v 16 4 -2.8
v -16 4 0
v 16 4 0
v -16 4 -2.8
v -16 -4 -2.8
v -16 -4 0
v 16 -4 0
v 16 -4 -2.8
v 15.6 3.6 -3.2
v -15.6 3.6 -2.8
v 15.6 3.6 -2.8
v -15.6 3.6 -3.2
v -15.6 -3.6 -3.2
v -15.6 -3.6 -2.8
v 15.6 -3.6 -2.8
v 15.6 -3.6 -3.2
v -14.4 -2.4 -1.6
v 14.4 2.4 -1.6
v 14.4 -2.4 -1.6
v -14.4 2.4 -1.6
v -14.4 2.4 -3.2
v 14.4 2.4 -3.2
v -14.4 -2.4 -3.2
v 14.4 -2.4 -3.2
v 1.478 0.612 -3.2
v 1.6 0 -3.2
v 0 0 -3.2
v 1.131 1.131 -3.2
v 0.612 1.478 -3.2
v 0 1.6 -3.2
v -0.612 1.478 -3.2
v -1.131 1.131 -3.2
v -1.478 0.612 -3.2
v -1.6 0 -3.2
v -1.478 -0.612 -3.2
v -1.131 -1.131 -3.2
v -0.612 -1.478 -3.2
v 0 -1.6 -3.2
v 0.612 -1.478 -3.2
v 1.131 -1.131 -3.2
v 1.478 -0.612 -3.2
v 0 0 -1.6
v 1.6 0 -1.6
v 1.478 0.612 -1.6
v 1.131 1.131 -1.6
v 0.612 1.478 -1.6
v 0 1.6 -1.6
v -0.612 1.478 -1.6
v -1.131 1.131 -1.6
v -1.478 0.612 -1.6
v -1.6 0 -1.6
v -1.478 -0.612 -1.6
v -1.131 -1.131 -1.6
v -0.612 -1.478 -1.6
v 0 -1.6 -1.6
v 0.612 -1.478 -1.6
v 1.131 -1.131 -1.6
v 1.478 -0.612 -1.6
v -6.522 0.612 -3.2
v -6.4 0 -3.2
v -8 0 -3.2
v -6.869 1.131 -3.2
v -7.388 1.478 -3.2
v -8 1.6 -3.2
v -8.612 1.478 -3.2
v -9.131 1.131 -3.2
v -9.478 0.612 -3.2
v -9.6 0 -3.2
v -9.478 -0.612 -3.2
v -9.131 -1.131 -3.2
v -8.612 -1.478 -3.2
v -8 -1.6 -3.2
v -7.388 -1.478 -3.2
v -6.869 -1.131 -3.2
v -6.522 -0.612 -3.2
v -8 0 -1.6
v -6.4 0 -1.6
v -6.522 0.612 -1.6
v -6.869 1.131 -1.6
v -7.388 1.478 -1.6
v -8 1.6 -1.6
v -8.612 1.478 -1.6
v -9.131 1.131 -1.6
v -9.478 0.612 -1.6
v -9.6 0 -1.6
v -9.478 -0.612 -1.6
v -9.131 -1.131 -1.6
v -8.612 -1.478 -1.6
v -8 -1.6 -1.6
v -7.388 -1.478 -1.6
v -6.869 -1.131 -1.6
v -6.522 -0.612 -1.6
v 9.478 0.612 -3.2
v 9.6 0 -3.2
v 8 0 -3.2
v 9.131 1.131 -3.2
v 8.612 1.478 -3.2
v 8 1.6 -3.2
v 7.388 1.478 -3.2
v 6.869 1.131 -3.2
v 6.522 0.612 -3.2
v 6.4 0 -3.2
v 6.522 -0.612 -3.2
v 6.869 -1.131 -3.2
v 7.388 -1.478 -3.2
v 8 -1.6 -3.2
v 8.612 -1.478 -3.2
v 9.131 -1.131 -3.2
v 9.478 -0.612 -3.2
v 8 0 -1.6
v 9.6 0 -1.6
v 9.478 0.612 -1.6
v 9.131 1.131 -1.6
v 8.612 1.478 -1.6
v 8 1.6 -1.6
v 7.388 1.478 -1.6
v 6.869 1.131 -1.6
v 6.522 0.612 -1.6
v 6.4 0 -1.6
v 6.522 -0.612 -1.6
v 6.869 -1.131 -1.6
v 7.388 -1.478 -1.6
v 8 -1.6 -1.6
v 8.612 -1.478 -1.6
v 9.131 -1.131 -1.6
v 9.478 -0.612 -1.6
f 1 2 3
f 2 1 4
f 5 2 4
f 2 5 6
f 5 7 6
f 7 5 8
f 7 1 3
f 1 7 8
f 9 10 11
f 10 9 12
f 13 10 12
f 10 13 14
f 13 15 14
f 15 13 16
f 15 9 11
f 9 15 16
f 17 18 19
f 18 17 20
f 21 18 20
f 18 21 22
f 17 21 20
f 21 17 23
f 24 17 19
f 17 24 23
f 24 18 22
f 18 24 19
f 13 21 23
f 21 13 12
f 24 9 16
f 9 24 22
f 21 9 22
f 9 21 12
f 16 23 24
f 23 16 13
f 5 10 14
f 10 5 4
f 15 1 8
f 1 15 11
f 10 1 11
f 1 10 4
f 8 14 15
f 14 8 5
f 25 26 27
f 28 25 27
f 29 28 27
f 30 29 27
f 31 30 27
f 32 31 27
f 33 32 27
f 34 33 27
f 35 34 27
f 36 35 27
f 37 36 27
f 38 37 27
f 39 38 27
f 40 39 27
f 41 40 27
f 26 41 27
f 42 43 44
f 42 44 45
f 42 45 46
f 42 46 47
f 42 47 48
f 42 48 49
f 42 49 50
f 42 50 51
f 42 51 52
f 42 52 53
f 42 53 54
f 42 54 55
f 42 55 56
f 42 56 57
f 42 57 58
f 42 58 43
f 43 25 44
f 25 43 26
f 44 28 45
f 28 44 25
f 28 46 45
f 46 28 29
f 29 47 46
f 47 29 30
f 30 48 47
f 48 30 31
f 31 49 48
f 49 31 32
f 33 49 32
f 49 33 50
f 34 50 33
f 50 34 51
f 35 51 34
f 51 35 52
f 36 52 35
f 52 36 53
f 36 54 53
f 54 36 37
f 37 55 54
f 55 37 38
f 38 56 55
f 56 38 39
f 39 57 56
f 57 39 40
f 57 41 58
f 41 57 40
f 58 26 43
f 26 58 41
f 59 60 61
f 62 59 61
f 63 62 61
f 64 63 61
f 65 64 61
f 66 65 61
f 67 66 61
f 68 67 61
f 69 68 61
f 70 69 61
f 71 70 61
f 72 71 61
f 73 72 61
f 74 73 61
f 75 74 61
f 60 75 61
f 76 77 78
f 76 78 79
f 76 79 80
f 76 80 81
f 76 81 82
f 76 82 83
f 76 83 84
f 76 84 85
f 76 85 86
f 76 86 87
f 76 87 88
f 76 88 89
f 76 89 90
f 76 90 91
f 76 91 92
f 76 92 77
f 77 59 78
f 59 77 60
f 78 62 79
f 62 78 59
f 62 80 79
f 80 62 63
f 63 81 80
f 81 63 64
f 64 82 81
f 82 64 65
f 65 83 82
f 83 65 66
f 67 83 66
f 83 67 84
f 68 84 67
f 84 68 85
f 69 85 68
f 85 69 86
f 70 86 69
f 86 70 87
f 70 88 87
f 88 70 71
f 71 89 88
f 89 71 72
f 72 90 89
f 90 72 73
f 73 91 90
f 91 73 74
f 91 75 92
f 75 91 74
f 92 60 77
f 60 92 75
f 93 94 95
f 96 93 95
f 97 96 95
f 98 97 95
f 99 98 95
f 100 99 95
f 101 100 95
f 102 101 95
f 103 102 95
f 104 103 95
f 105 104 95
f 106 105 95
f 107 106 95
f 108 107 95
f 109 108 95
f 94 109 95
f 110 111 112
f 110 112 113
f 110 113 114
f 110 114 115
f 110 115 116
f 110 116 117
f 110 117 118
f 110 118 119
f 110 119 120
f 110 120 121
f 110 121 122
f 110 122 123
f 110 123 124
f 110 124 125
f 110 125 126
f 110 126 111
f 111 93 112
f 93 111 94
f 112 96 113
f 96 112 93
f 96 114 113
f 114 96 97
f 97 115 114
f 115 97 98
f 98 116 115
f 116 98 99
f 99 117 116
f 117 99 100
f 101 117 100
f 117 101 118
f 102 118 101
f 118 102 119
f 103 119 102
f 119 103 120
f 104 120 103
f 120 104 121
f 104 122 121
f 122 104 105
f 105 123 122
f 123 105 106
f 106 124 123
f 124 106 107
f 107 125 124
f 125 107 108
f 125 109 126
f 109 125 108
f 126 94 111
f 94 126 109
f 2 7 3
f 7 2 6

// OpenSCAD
// file: ../p/4-4edge.scad
use <../lib.scad>
function ldraw_lib__4_4edge() = [
// 0 Circle 1.0
// 0 Name: 4-4edge.dat
// 0 Author: James Jessiman
// 0 !LDRAW_ORG Primitive UPDATE 2017-01
// 0 !LICENSE Licensed under CC BY 2.0 and CC BY 4.0 : see CAreadme.txt
// 
// 0 BFC CERTIFY CCW
  [0,"BFC","CERTIFY"],
  [0,"BFC","CCW"],
// 
// 0 !HISTORY 1998-12-15 [PTadmin] Official Update 1998-10
// 0 !HISTORY 2005-12-28 [PTadmin] Official Update 2005-01
// 0 !HISTORY 2007-06-24 [PTadmin] Header formatted for Contributor Agreement
// 0 !HISTORY 2008-07-01 [PTadmin] Official Update 2008-01
// 0 !HISTORY 2017-01-15 [Steffen] BFCed
// 0 !HISTORY 2017-12-30 [PTadmin] Official Update 2017-01
// 
// 
// 2 24 1 0 0 0.9239 0 0.3827
  [2,24,1,0,0,0.9239,0,0.3827],
// 2 24 0.9239 0 0.3827 0.7071 0 0.7071
  [2,24,0.9239,0,0.3827,0.7071,0,0.7071],
// 2 24 0.7071 0 0.7071 0.3827 0 0.9239
  [2,24,0.7071,0,0.7071,0.3827,0,0.9239],
// 2 24 0.3827 0 0.9239 0 0 1
  [2,24,0.3827,0,0.9239,0,0,1],
// 2 24 0 0 1 -0.3827 0 0.9239
  [2,24,0,0,1,-0.3827,0,0.9239],
// 2 24 -0.3827 0 0.9239 -0.7071 0 0.7071
  [2,24,-0.3827,0,0.9239,-0.7071,0,0.7071],
// 2 24 -0.7071 0 0.7071 -0.9239 0 0.3827
  [2,24,-0.7071,0,0.7071,-0.9239,0,0.3827],
// 2 24 -0.9239 0 0.3827 -1 0 -0
  [2,24,-0.9239,0,0.3827,-1,0,-0],
// 2 24 -1 0 -0 -0.9239 0 -0.3827
  [2,24,-1,0,-0,-0.9239,0,-0.3827],
// 2 24 -0.9239 0 -0.3827 -0.7071 0 -0.7071
  [2,24,-0.9239,0,-0.3827,-0.7071,0,-0.7071],
// 2 24 -0.7071 0 -0.7071 -0.3827 0 -0.9239
  [2,24,-0.7071,0,-0.7071,-0.3827,0,-0.9239],
// 2 24 -0.3827 0 -0.9239 0 0 -1
  [2,24,-0.3827,0,-0.9239,0,0,-1],
// 2 24 0 0 -1 0.3827 0 -0.9239
  [2,24,0,0,-1,0.3827,0,-0.9239],
// 2 24 0.3827 0 -0.9239 0.7071 0 -0.7071
  [2,24,0.3827,0,-0.9239,0.7071,0,-0.7071],
// 2 24 0.7071 0 -0.7071 0.9239 0 -0.3827
  [2,24,0.7071,0,-0.7071,0.9239,0,-0.3827],
// 2 24 0.9239 0 -0.3827 1 0 0
  [2,24,0.9239,0,-0.3827,1,0,0],
];
module ldraw_lib__4_4edge(step=0, col=false, unit=2/5, alt=false, line=0.2, solid=!$preview)
    makepoly(ldraw_lib__4_4edge(), step=step, col=col, unit=unit, alt=alt, line=line, solid=solid);
ldraw_lib__4_4edge(line=0.2);
// file: ../p/4-4disc.scad
use <../lib.scad>
function ldraw_lib__4_4disc() = [
// 0 Disc 1.0
// 0 Name: 4-4disc.dat
// 0 Author: James Jessiman
// 0 !LDRAW_ORG Primitive UPDATE 2002-02
// 0 !LICENSE Licensed under CC BY 2.0 and CC BY 4.0 : see CAreadme.txt
// 
// 0 BFC CERTIFY CCW
  [0,"BFC","CERTIFY"],
  [0,"BFC","CCW"],
// 
// 0 !HISTORY 1998-12-15 [PTadmin] Official Update 1998-10
// 0 !HISTORY 2002-03-23 [sbliss] Added BFC statement
// 0 !HISTORY 2002-04-25 [PTadmin] Official Update 2002-02
// 0 !HISTORY 2007-06-24 [PTadmin] Header formatted for Contributor Agreement
// 0 !HISTORY 2008-07-01 [PTadmin] Official Update 2008-01
// 
// 
// 3 16 0 0 0 1 0 0 0.9239 0 0.3827
  [3,16,0,0,0,1,0,0,0.9239,0,0.3827],
// 3 16 0 0 0 0.9239 0 0.3827 0.7071 0 0.7071
  [3,16,0,0,0,0.9239,0,0.3827,0.7071,0,0.7071],
// 3 16 0 0 0 0.7071 0 0.7071 0.3827 0 0.9239
  [3,16,0,0,0,0.7071,0,0.7071,0.3827,0,0.9239],
// 3 16 0 0 0 0.3827 0 0.9239 0 0 1
  [3,16,0,0,0,0.3827,0,0.9239,0,0,1],
// 3 16 0 0 0 0 0 1 -0.3827 0 0.9239
  [3,16,0,0,0,0,0,1,-0.3827,0,0.9239],
// 3 16 0 0 0 -0.3827 0 0.9239 -0.7071 0 0.7071
  [3,16,0,0,0,-0.3827,0,0.9239,-0.7071,0,0.7071],
// 3 16 0 0 0 -0.7071 0 0.7071 -0.9239 0 0.3827
  [3,16,0,0,0,-0.7071,0,0.7071,-0.9239,0,0.3827],
// 3 16 0 0 0 -0.9239 0 0.3827 -1 0 -0
  [3,16,0,0,0,-0.9239,0,0.3827,-1,0,-0],
// 3 16 0 0 0 -1 0 -0 -0.9239 0 -0.3827
  [3,16,0,0,0,-1,0,-0,-0.9239,0,-0.3827],
// 3 16 0 0 0 -0.9239 0 -0.3827 -0.7071 0 -0.7071
  [3,16,0,0,0,-0.9239,0,-0.3827,-0.7071,0,-0.7071],
// 3 16 0 0 0 -0.7071 0 -0.7071 -0.3827 0 -0.9239
  [3,16,0,0,0,-0.7071,0,-0.7071,-0.3827,0,-0.9239],
// 3 16 0 0 0 -0.3827 0 -0.9239 0 0 -1
  [3,16,0,0,0,-0.3827,0,-0.9239,0,0,-1],
// 3 16 0 0 0 0 0 -1 0.3827 0 -0.9239
  [3,16,0,0,0,0,0,-1,0.3827,0,-0.9239],
// 3 16 0 0 0 0.3827 0 -0.9239 0.7071 0 -0.7071
  [3,16,0,0,0,0.3827,0,-0.9239,0.7071,0,-0.7071],
// 3 16 0 0 0 0.7071 0 -0.7071 0.9239 0 -0.3827
  [3,16,0,0,0,0.7071,0,-0.7071,0.9239,0,-0.3827],
// 3 16 0 0 0 0.9239 0 -0.3827 1 0 0
  [3,16,0,0,0,0.9239,0,-0.3827,1,0,0],
// 0
];
module ldraw_lib__4_4disc(step=0, col=false, unit=2/5, alt=false, line=0.2, solid=!$preview)
    makepoly(ldraw_lib__4_4disc(), step=step, col=col, unit=unit, alt=alt, line=line, solid=solid);
ldraw_lib__4_4disc(line=0.2);
// file: ../p/4-4cyli.scad
use <../lib.scad>
$fa=1; $fs=0.2;
function ldraw_lib__4_4cyli(realsolid=false) = [
// 0 Cylinder 1.0
// 0 Name: 4-4cyli.dat
// 0 Author: James Jessiman
// 0 !LDRAW_ORG Primitive UPDATE 2005-01
// 0 !LICENSE Licensed under CC BY 2.0 and CC BY 4.0 : see CAreadme.txt
// 
// 0 BFC CERTIFY CCW
  [0,"BFC","CERTIFY"],
  [0,"BFC","CCW"],
// 
// 0 !HISTORY 1998-12-15 [PTadmin] Official Update 1998-10
// 0 !HISTORY 2002-03-23 [sbliss] Added BFC statement; merged headers from files in distributions LDraw 0.27 and Complete.
// 0 !HISTORY 2002-04-25 [PTadmin] Official Update 2002-02
// 0 !HISTORY 2004-12-14 [guyvivan] BFC CCW
// 0 !HISTORY 2005-12-28 [PTadmin] Official Update 2005-01
// 0 !HISTORY 2007-06-24 [PTadmin] Header formatted for Contributor Agreement
// 0 !HISTORY 2008-07-01 [PTadmin] Official Update 2008-01
// 
// 
// 4 16 1 1 0 0.9239 1 0.3827 0.9239 0 0.3827 1 0 0
  [4,16,1,1,0,0.9239,1,0.3827,0.9239,0,0.3827,1,0,0],
// 5 24 1 0 0 1 1 0 0.9239 0 0.3827 0.9239 0 -0.3827
  [5,24,1,0,0,1,1,0,0.9239,0,0.3827,0.9239,0,-0.3827],
// 4 16 0.9239 1 0.3827 0.7071 1 0.7071 0.7071 0 0.7071 0.9239 0 0.3827
  [4,16,0.9239,1,0.3827,0.7071,1,0.7071,0.7071,0,0.7071,0.9239,0,0.3827],
// 5 24 0.9239 0 0.3827 0.9239 1 0.3827 0.7071 0 0.7071 1 0 0
  [5,24,0.9239,0,0.3827,0.9239,1,0.3827,0.7071,0,0.7071,1,0,0],
// 4 16 0.7071 1 0.7071 0.3827 1 0.9239 0.3827 0 0.9239 0.7071 0 0.7071
  [4,16,0.7071,1,0.7071,0.3827,1,0.9239,0.3827,0,0.9239,0.7071,0,0.7071],
// 5 24 0.7071 0 0.7071 0.7071 1 0.7071 0.3827 0 0.9239 0.9239 0 0.3827
  [5,24,0.7071,0,0.7071,0.7071,1,0.7071,0.3827,0,0.9239,0.9239,0,0.3827],
// 4 16 0.3827 1 0.9239 0 1 1 0 0 1 0.3827 0 0.9239
  [4,16,0.3827,1,0.9239,0,1,1,0,0,1,0.3827,0,0.9239],
// 5 24 0.3827 0 0.9239 0.3827 1 0.9239 0 0 1 0.7071 0 0.7071
  [5,24,0.3827,0,0.9239,0.3827,1,0.9239,0,0,1,0.7071,0,0.7071],
// 4 16 0 1 1 -0.3827 1 0.9239 -0.3827 0 0.9239 0 0 1
  [4,16,0,1,1,-0.3827,1,0.9239,-0.3827,0,0.9239,0,0,1],
// 5 24 0 0 1 0 1 1 -0.3827 0 0.9239 0.3827 0 0.9239
  [5,24,0,0,1,0,1,1,-0.3827,0,0.9239,0.3827,0,0.9239],
// 4 16 -0.3827 1 0.9239 -0.7071 1 0.7071 -0.7071 0 0.7071 -0.3827 0 0.9239
  [4,16,-0.3827,1,0.9239,-0.7071,1,0.7071,-0.7071,0,0.7071,-0.3827,0,0.9239],
// 5 24 -0.3827 0 0.9239 -0.3827 1 0.9239 -0.7071 0 0.7071 0 0 1
  [5,24,-0.3827,0,0.9239,-0.3827,1,0.9239,-0.7071,0,0.7071,0,0,1],
// 4 16 -0.7071 1 0.7071 -0.9239 1 0.3827 -0.9239 0 0.3827 -0.7071 0 0.7071
  [4,16,-0.7071,1,0.7071,-0.9239,1,0.3827,-0.9239,0,0.3827,-0.7071,0,0.7071],
// 5 24 -0.7071 0 0.7071 -0.7071 1 0.7071 -0.9239 0 0.3827 -0.3827 0 0.9239
  [5,24,-0.7071,0,0.7071,-0.7071,1,0.7071,-0.9239,0,0.3827,-0.3827,0,0.9239],
// 4 16 -0.9239 1 0.3827 -1 1 0 -1 0 0 -0.9239 0 0.3827
  [4,16,-0.9239,1,0.3827,-1,1,0,-1,0,0,-0.9239,0,0.3827],
// 5 24 -0.9239 0 0.3827 -0.9239 1 0.3827 -1 0 0 -0.7071 0 0.7071
  [5,24,-0.9239,0,0.3827,-0.9239,1,0.3827,-1,0,0,-0.7071,0,0.7071],
// 4 16 -1 1 0 -0.9239 1 -0.3827 -0.9239 0 -0.3827 -1 0 0
  [4,16,-1,1,0,-0.9239,1,-0.3827,-0.9239,0,-0.3827,-1,0,0],
// 5 24 -1 0 0 -1 1 0 -0.9239 0 -0.3827 -0.9239 0 0.3827
  [5,24,-1,0,0,-1,1,0,-0.9239,0,-0.3827,-0.9239,0,0.3827],
// 4 16 -0.9239 1 -0.3827 -0.7071 1 -0.7071 -0.7071 0 -0.7071 -0.9239 0 -0.3827
  [4,16,-0.9239,1,-0.3827,-0.7071,1,-0.7071,-0.7071,0,-0.7071,-0.9239,0,-0.3827],
// 5 24 -0.9239 0 -0.3827 -0.9239 1 -0.3827 -0.7071 0 -0.7071 -1 0 0
  [5,24,-0.9239,0,-0.3827,-0.9239,1,-0.3827,-0.7071,0,-0.7071,-1,0,0],
// 4 16 -0.7071 1 -0.7071 -0.3827 1 -0.9239 -0.3827 0 -0.9239 -0.7071 0 -0.7071
  [4,16,-0.7071,1,-0.7071,-0.3827,1,-0.9239,-0.3827,0,-0.9239,-0.7071,0,-0.7071],
// 5 24 -0.7071 0 -0.7071 -0.7071 1 -0.7071 -0.3827 0 -0.9239 -0.9239 0 -0.3827
  [5,24,-0.7071,0,-0.7071,-0.7071,1,-0.7071,-0.3827,0,-0.9239,-0.9239,0,-0.3827],
// 4 16 -0.3827 1 -0.9239 0 1 -1 0 0 -1 -0.3827 0 -0.9239
  [4,16,-0.3827,1,-0.9239,0,1,-1,0,0,-1,-0.3827,0,-0.9239],
// 5 24 -0.3827 0 -0.9239 -0.3827 1 -0.9239 0 0 -1 -0.7071 0 -0.7071
  [5,24,-0.3827,0,-0.9239,-0.3827,1,-0.9239,0,0,-1,-0.7071,0,-0.7071],
// 4 16 0 1 -1 0.3827 1 -0.9239 0.3827 0 -0.9239 0 0 -1
  [4,16,0,1,-1,0.3827,1,-0.9239,0.3827,0,-0.9239,0,0,-1],
// 5 24 0 0 -1 0 1 -1 0.3827 0 -0.9239 -0.3827 0 -0.9239
  [5,24,0,0,-1,0,1,-1,0.3827,0,-0.9239,-0.3827,0,-0.9239],
// 4 16 0.3827 1 -0.9239 0.7071 1 -0.7071 0.7071 0 -0.7071 0.3827 0 -0.9239
  [4,16,0.3827,1,-0.9239,0.7071,1,-0.7071,0.7071,0,-0.7071,0.3827,0,-0.9239],
// 5 24 0.3827 0 -0.9239 0.3827 1 -0.9239 0.7071 0 -0.7071 0 0 -1
  [5,24,0.3827,0,-0.9239,0.3827,1,-0.9239,0.7071,0,-0.7071,0,0,-1],
// 4 16 0.7071 1 -0.7071 0.9239 1 -0.3827 0.9239 0 -0.3827 0.7071 0 -0.7071
  [4,16,0.7071,1,-0.7071,0.9239,1,-0.3827,0.9239,0,-0.3827,0.7071,0,-0.7071],
// 5 24 0.7071 0 -0.7071 0.7071 1 -0.7071 0.9239 0 -0.3827 0.3827 0 -0.9239
  [5,24,0.7071,0,-0.7071,0.7071,1,-0.7071,0.9239,0,-0.3827,0.3827,0,-0.9239],
// 4 16 0.9239 1 -0.3827 1 1 0 1 0 0 0.9239 0 -0.3827
  [4,16,0.9239,1,-0.3827,1,1,0,1,0,0,0.9239,0,-0.3827],
// 5 24 0.9239 0 -0.3827 0.9239 1 -0.3827 1 0 0 0.7071 0 -0.7071
  [5,24,0.9239,0,-0.3827,0.9239,1,-0.3827,1,0,0,0.7071,0,-0.7071],
// 0
];
module ldraw_lib__4_4cyli(step=0, col=false, unit=2/5, alt=false, line=0.2, solid=!$preview)
    makepoly(ldraw_lib__4_4cyli(solid), step=step, col=col, unit=unit, alt=alt, line=line, solid=solid);
ldraw_lib__4_4cyli(line=0.2);
// file: ../p/stud3.scad
use <../lib.scad>
use <4-4cyli.scad>
use <4-4disc.scad>
use <4-4edge.scad>
function ldraw_lib__stud3() = [
// 0 Stud Tube Solid
// 0 Name: stud3.dat
// 0 Author: James Jessiman
// 0 !LDRAW_ORG Primitive UPDATE 2012-01
// 0 !LICENSE Licensed under CC BY 4.0 : see CAreadme.txt
// 
// 0 BFC CERTIFY CCW
  [0,"BFC","CERTIFY"],
  [0,"BFC","CCW"],
// 
// 0 !HISTORY 2002-04-04 [sbliss] Modified for BFC compliance
// 0 !HISTORY 2002-04-25 [PTadmin] Official Update 2002-02
// 0 !HISTORY 2007-06-24 [PTadmin] Header formatted for Contributor Agreement
// 0 !HISTORY 2008-07-01 [PTadmin] Official Update 2008-01
// 0 !HISTORY 2012-02-16 [Philo] Changed to CCW
// 0 !HISTORY 2012-03-30 [PTadmin] Official Update 2012-01
// 
// 
// 1 16 0 -4 0 4 0 0 0 1 0 0 0 4 4-4edge.dat
  [1,16,0,-4,0,4,0,0,0,1,0,0,0,4, ldraw_lib__4_4edge()],
// 1 16 0 0 0 4 0 0 0 1 0 0 0 4 4-4edge.dat
  [1,16,0,0,0,4,0,0,0,1,0,0,0,4, ldraw_lib__4_4edge()],
// 1 16 0 -4 0 4 0 0 0 1 0 0 0 4 4-4disc.dat
  [1,16,0,-4,0,4,0,0,0,1,0,0,0,4, ldraw_lib__4_4disc()],
  [-1,16,0,0,0,4,0,0,0,-1,0,0,0,4, ldraw_lib__4_4disc()],
// 1 16 0 -4 0 4 0 0 0 4 0 0 0 4 4-4cyli.dat
  [1,16,0,-4,0,4,0,0,0,4,0,0,0,4, ldraw_lib__4_4cyli()],
];
module ldraw_lib__stud3(step=0, col=false, unit=2/5, alt=false, line=0.2, solid=!$preview)
    makepoly(ldraw_lib__stud3(), step=step, col=col, unit=unit, alt=alt, line=line, solid=solid);
ldraw_lib__stud3(line=0.2);
// file: ../p/box5.scad
use <../lib.scad>
function ldraw_lib__box5() = [
// 0 Box with 5 Faces and All Edges
// 0 Name: box5.dat
// 0 Author: James Jessiman
// 0 !LDRAW_ORG Primitive UPDATE 2012-01
// 0 !LICENSE Licensed under CC BY 2.0 and CC BY 4.0 : see CAreadme.txt
// 
// 0 BFC CERTIFY CCW
  [0,"BFC","CERTIFY"],
  [0,"BFC","CCW"],
// 
// 0 !HISTORY 2002-04-03 [sbliss] Modified for BFC compliance
// 0 !HISTORY 2002-04-25 [PTadmin] Official Update 2002-02
// 0 !HISTORY 2007-06-24 [PTadmin] Header formatted for Contributor Agreement
// 0 !HISTORY 2008-07-01 [PTadmin] Official Update 2008-01
// 0 !HISTORY 2012-02-16 [Philo] Changed to CCW
// 0 !HISTORY 2012-03-30 [PTadmin] Official Update 2012-01
// 
// 
// 2 24 1 1 1 -1 1 1
  [2,24,1,1,1,-1,1,1],
// 2 24 -1 1 1 -1 1 -1
  [2,24,-1,1,1,-1,1,-1],
// 2 24 -1 1 -1 1 1 -1
  [2,24,-1,1,-1,1,1,-1],
// 2 24 1 1 -1 1 1 1
  [2,24,1,1,-1,1,1,1],
// 2 24 1 0 1 -1 0 1
  [2,24,1,0,1,-1,0,1],
// 2 24 -1 0 1 -1 0 -1
  [2,24,-1,0,1,-1,0,-1],
// 2 24 -1 0 -1 1 0 -1
  [2,24,-1,0,-1,1,0,-1],
// 2 24 1 0 -1 1 0 1
  [2,24,1,0,-1,1,0,1],
// 2 24 1 0 1 1 1 1
  [2,24,1,0,1,1,1,1],
// 2 24 -1 0 1 -1 1 1
  [2,24,-1,0,1,-1,1,1],
// 2 24 1 0 -1 1 1 -1
  [2,24,1,0,-1,1,1,-1],
// 2 24 -1 0 -1 -1 1 -1
  [2,24,-1,0,-1,-1,1,-1],
// 4 16 -1 1 1 1 1 1 1 1 -1 -1 1 -1
  [4,16,-1,1,1,1,1,1,1,1,-1,-1,1,-1],
// 4 16 -1 1 1 -1 0 1 1 0 1 1 1 1
  [4,16,-1,1,1,-1,0,1,1,0,1,1,1,1],
// 4 16 -1 1 -1 -1 0 -1 -1 0 1 -1 1 1
  [4,16,-1,1,-1,-1,0,-1,-1,0,1,-1,1,1],
// 4 16 1 1 -1 1 0 -1 -1 0 -1 -1 1 -1
  [4,16,1,1,-1,1,0,-1,-1,0,-1,-1,1,-1],
// 4 16 1 1 1 1 0 1 1 0 -1 1 1 -1
  [4,16,1,1,1,1,0,1,1,0,-1,1,1,-1],
];
makepoly(ldraw_lib__box5(), line=0.2);
// file: ../p/box4.scad
use <../lib.scad>
function ldraw_lib__box4() = [
// 0 Box with 4 Faces (2 Parallel Pairs) and All Edges
// 0 Name: box4.dat
// 0 Author: James Jessiman
// 0 !LDRAW_ORG Primitive UPDATE 2012-01
// 0 !LICENSE Licensed under CC BY 4.0 : see CAreadme.txt
// 
// 0 BFC CERTIFY CCW
  [0,"BFC","CERTIFY"],
  [0,"BFC","CCW"],
// 
// 0 !HISTORY 2002-04-03 [sbliss] Modified for BFC compliance
// 0 !HISTORY 2002-04-25 [PTadmin] Official Update 2002-02
// 0 !HISTORY 2007-06-24 [PTadmin] Header formatted for Contributor Agreement
// 0 !HISTORY 2008-07-01 [PTadmin] Official Update 2008-01
// 0 !HISTORY 2012-02-16 [Philo] Changed to CCW
// 0 !HISTORY 2012-03-30 [PTadmin] Official Update 2012-01
// 
// 
// 2 24 1 1 1 -1 1 1
  [2,24,1,1,1,-1,1,1],
// 2 24 -1 1 1 -1 1 -1
  [2,24,-1,1,1,-1,1,-1],
// 2 24 -1 1 -1 1 1 -1
  [2,24,-1,1,-1,1,1,-1],
// 2 24 1 1 -1 1 1 1
  [2,24,1,1,-1,1,1,1],
// 2 24 1 0 1 -1 0 1
  [2,24,1,0,1,-1,0,1],
// 2 24 -1 0 1 -1 0 -1
  [2,24,-1,0,1,-1,0,-1],
// 2 24 -1 0 -1 1 0 -1
  [2,24,-1,0,-1,1,0,-1],
// 2 24 1 0 -1 1 0 1
  [2,24,1,0,-1,1,0,1],
// 2 24 1 0 1 1 1 1
  [2,24,1,0,1,1,1,1],
// 2 24 -1 0 1 -1 1 1
  [2,24,-1,0,1,-1,1,1],
// 2 24 1 0 -1 1 1 -1
  [2,24,1,0,-1,1,1,-1],
// 2 24 -1 0 -1 -1 1 -1
  [2,24,-1,0,-1,-1,1,-1],
// 4 16 -1 1 1 -1 0 1 1 0 1 1 1 1
  [4,16,-1,1,1,-1,0,1,1,0,1,1,1,1],
// 4 16 -1 1 -1 -1 0 -1 -1 0 1 -1 1 1
  [4,16,-1,1,-1,-1,0,-1,-1,0,1,-1,1,1],
// 4 16 1 1 -1 1 0 -1 -1 0 -1 -1 1 -1
  [4,16,1,1,-1,1,0,-1,-1,0,-1,-1,1,-1],
// 4 16 1 1 1 1 0 1 1 0 -1 1 1 -1
  [4,16,1,1,1,1,0,1,1,0,-1,1,1,-1],
];
module ldraw_lib__box4(step=0, col=false, unit=2/5, alt=false, line=0.2, solid=!$preview)
    makepoly(ldraw_lib__box4(), step=step, col=col, unit=unit, alt=alt, line=line, solid=solid);
ldraw_lib__box4(line=0.2);
// file: s/2431s01.scad
use <../../lib.scad>
use <../../p/box4.scad>
use <../../p/box5.scad>
use <../../p/stud3.scad>
function ldraw_lib__s__2431s01() = [
// 0 ~Tile  1 x  4 with Groove without Top Face
// 0 Name: s\2431s01.dat
// 0 Author: Santeri Piippo [arezey]
// 0 !LDRAW_ORG Subpart UPDATE 2010-02
// 0 !LICENSE Licensed under CC BY 2.0 and CC BY 4.0 : see CAreadme.txt
// 
// 0 BFC CERTIFY CCW
  [0,"BFC","CERTIFY"],
  [0,"BFC","CCW"],
// 
// 0 !HISTORY 2010-07-05 [PTadmin] Official Update 2010-02
// 
// 
// 1 16 0 0 0 40 0 0 0 7 0 0 0 10 box4.dat
  [1,16,0,0,0,40,0,0,0,7,0,0,0,10, ldraw_lib__box4()],
// 1 16 0 7 0 39 0 0 0 1 0 0 0 9 box4.dat
  [1,16,0,7,0,39,0,0,0,1,0,0,0,9, ldraw_lib__box4()],
// 0 BFC INVERTNEXT
  [0,"BFC","INVERTNEXT"],
// 1 16 0 8 0 36 0 0 0 -4 0 0 0 6 box5.dat
  [1,16,0,8,0,36,0,0,0,-4,0,0,0,6, ldraw_lib__box5()],
// 4 16 -39 8 9 -36 8 6 -36 8 -6 -39 8 -9
  [4,16,-39,8,9,-36,8,6,-36,8,-6,-39,8,-9],
// 4 16 39 8 -9 36 8 -6 36 8 6 39 8 9
  [4,16,39,8,-9,36,8,-6,36,8,6,39,8,9],
// 4 16 39 8 9 36 8 6 -36 8 6 -39 8 9
  [4,16,39,8,9,36,8,6,-36,8,6,-39,8,9],
// 4 16 -39 8 -9 -36 8 -6 36 8 -6 39 8 -9
  [4,16,-39,8,-9,-36,8,-6,36,8,-6,39,8,-9],
// 4 16 -40 7 10 -39 7 9 -39 7 -9 -40 7 -10
  [4,16,-40,7,10,-39,7,9,-39,7,-9,-40,7,-10],
// 4 16 40 7 -10 39 7 -9 39 7 9 40 7 10
  [4,16,40,7,-10,39,7,-9,39,7,9,40,7,10],
// 4 16 40 7 10 39 7 9 -39 7 9 -40 7 10
  [4,16,40,7,10,39,7,9,-39,7,9,-40,7,10],
// 4 16 -40 7 -10 -39 7 -9 39 7 -9 40 7 -10
  [4,16,-40,7,-10,-39,7,-9,39,7,-9,40,7,-10],
// 1 16 0 4 0 1 0 0 0 -1 0 0 0 1 stud3.dat
  [1,16,0,4,0,1,0,0,0,-1,0,0,0,1, ldraw_lib__stud3()],
// 1 16 -20 4 0 1 0 0 0 -1 0 0 0 1 stud3.dat
  [1,16,-20,4,0,1,0,0,0,-1,0,0,0,1, ldraw_lib__stud3()],
// 1 16 20 4 0 1 0 0 0 -1 0 0 0 1 stud3.dat
  [1,16,20,4,0,1,0,0,0,-1,0,0,0,1, ldraw_lib__stud3()],
// 0 //
];
makepoly(ldraw_lib__s__2431s01(), line=0.2);
// file: 2431.scad
use <../lib.scad>
use <s/2431s01.scad>
function ldraw_lib__2431() = [
// 0 Tile  1 x  4 with Groove
// 0 Name: 2431.dat
// 0 Author: Santeri Piippo [arezey]
// 0 !LDRAW_ORG Part UPDATE 2010-02
// 0 !LICENSE Licensed under CC BY 2.0 and CC BY 4.0 : see CAreadme.txt
// 
// 0 BFC CERTIFY CCW
  [0,"BFC","CERTIFY"],
  [0,"BFC","CCW"],
// 
// 0 !HISTORY 2010-07-05 [PTadmin] Official Update 2010-02
// 
// 
// 1 16 0 0 0 1 0 0 0 1 0 0 0 1 s\2431s01.dat
  [1,16,0,0,0,1,0,0,0,1,0,0,0,1, ldraw_lib__s__2431s01()],
// 4 16 40 0 -10 40 0 10 -40 0 10 -40 0 -10
  [4,16,40,0,-10,40,0,10,-40,0,10,-40,0,-10],
// 0 //
];
makepoly(ldraw_lib__2431(), line=0.2);
// main file
use <../lib.scad>
use <2431.scad>
function ldraw_lib__35371() = [
// 0 =Tile  1 x  4 with Groove
// 0 Name: 35371.dat
// 0 Author: Massimo Maso [Sirio]
// 0 !LDRAW_ORG Part Alias UPDATE 2025-05
// 0 !LICENSE Licensed under CC BY 4.0 : see CAreadme.txt
// 
// 0 BFC CERTIFY CCW
  [0,"BFC","CERTIFY"],
  [0,"BFC","CCW"],
// 
// 0 !KEYWORDS BrickLink 2431, Rebrickable 2431
// 
// 0 !HISTORY 2025-05-28 [OrionP] Official Update 2025-05
// 
// 1 16 0 0 0 1 0 0 0 1 0 0 0 1 2431.dat
  [1,16,0,0,0,1,0,0,0,1,0,0,0,1, ldraw_lib__2431()],
];
module ldraw_lib__35371(step=0, col=false, unit=2/5, alt=false, line=0.2, solid=!$preview)
    makepoly(ldraw_lib__35371(), step=step, col=col, unit=unit, alt=alt, line=line, solid=solid);
ldraw_lib__35371(line=0.2);
